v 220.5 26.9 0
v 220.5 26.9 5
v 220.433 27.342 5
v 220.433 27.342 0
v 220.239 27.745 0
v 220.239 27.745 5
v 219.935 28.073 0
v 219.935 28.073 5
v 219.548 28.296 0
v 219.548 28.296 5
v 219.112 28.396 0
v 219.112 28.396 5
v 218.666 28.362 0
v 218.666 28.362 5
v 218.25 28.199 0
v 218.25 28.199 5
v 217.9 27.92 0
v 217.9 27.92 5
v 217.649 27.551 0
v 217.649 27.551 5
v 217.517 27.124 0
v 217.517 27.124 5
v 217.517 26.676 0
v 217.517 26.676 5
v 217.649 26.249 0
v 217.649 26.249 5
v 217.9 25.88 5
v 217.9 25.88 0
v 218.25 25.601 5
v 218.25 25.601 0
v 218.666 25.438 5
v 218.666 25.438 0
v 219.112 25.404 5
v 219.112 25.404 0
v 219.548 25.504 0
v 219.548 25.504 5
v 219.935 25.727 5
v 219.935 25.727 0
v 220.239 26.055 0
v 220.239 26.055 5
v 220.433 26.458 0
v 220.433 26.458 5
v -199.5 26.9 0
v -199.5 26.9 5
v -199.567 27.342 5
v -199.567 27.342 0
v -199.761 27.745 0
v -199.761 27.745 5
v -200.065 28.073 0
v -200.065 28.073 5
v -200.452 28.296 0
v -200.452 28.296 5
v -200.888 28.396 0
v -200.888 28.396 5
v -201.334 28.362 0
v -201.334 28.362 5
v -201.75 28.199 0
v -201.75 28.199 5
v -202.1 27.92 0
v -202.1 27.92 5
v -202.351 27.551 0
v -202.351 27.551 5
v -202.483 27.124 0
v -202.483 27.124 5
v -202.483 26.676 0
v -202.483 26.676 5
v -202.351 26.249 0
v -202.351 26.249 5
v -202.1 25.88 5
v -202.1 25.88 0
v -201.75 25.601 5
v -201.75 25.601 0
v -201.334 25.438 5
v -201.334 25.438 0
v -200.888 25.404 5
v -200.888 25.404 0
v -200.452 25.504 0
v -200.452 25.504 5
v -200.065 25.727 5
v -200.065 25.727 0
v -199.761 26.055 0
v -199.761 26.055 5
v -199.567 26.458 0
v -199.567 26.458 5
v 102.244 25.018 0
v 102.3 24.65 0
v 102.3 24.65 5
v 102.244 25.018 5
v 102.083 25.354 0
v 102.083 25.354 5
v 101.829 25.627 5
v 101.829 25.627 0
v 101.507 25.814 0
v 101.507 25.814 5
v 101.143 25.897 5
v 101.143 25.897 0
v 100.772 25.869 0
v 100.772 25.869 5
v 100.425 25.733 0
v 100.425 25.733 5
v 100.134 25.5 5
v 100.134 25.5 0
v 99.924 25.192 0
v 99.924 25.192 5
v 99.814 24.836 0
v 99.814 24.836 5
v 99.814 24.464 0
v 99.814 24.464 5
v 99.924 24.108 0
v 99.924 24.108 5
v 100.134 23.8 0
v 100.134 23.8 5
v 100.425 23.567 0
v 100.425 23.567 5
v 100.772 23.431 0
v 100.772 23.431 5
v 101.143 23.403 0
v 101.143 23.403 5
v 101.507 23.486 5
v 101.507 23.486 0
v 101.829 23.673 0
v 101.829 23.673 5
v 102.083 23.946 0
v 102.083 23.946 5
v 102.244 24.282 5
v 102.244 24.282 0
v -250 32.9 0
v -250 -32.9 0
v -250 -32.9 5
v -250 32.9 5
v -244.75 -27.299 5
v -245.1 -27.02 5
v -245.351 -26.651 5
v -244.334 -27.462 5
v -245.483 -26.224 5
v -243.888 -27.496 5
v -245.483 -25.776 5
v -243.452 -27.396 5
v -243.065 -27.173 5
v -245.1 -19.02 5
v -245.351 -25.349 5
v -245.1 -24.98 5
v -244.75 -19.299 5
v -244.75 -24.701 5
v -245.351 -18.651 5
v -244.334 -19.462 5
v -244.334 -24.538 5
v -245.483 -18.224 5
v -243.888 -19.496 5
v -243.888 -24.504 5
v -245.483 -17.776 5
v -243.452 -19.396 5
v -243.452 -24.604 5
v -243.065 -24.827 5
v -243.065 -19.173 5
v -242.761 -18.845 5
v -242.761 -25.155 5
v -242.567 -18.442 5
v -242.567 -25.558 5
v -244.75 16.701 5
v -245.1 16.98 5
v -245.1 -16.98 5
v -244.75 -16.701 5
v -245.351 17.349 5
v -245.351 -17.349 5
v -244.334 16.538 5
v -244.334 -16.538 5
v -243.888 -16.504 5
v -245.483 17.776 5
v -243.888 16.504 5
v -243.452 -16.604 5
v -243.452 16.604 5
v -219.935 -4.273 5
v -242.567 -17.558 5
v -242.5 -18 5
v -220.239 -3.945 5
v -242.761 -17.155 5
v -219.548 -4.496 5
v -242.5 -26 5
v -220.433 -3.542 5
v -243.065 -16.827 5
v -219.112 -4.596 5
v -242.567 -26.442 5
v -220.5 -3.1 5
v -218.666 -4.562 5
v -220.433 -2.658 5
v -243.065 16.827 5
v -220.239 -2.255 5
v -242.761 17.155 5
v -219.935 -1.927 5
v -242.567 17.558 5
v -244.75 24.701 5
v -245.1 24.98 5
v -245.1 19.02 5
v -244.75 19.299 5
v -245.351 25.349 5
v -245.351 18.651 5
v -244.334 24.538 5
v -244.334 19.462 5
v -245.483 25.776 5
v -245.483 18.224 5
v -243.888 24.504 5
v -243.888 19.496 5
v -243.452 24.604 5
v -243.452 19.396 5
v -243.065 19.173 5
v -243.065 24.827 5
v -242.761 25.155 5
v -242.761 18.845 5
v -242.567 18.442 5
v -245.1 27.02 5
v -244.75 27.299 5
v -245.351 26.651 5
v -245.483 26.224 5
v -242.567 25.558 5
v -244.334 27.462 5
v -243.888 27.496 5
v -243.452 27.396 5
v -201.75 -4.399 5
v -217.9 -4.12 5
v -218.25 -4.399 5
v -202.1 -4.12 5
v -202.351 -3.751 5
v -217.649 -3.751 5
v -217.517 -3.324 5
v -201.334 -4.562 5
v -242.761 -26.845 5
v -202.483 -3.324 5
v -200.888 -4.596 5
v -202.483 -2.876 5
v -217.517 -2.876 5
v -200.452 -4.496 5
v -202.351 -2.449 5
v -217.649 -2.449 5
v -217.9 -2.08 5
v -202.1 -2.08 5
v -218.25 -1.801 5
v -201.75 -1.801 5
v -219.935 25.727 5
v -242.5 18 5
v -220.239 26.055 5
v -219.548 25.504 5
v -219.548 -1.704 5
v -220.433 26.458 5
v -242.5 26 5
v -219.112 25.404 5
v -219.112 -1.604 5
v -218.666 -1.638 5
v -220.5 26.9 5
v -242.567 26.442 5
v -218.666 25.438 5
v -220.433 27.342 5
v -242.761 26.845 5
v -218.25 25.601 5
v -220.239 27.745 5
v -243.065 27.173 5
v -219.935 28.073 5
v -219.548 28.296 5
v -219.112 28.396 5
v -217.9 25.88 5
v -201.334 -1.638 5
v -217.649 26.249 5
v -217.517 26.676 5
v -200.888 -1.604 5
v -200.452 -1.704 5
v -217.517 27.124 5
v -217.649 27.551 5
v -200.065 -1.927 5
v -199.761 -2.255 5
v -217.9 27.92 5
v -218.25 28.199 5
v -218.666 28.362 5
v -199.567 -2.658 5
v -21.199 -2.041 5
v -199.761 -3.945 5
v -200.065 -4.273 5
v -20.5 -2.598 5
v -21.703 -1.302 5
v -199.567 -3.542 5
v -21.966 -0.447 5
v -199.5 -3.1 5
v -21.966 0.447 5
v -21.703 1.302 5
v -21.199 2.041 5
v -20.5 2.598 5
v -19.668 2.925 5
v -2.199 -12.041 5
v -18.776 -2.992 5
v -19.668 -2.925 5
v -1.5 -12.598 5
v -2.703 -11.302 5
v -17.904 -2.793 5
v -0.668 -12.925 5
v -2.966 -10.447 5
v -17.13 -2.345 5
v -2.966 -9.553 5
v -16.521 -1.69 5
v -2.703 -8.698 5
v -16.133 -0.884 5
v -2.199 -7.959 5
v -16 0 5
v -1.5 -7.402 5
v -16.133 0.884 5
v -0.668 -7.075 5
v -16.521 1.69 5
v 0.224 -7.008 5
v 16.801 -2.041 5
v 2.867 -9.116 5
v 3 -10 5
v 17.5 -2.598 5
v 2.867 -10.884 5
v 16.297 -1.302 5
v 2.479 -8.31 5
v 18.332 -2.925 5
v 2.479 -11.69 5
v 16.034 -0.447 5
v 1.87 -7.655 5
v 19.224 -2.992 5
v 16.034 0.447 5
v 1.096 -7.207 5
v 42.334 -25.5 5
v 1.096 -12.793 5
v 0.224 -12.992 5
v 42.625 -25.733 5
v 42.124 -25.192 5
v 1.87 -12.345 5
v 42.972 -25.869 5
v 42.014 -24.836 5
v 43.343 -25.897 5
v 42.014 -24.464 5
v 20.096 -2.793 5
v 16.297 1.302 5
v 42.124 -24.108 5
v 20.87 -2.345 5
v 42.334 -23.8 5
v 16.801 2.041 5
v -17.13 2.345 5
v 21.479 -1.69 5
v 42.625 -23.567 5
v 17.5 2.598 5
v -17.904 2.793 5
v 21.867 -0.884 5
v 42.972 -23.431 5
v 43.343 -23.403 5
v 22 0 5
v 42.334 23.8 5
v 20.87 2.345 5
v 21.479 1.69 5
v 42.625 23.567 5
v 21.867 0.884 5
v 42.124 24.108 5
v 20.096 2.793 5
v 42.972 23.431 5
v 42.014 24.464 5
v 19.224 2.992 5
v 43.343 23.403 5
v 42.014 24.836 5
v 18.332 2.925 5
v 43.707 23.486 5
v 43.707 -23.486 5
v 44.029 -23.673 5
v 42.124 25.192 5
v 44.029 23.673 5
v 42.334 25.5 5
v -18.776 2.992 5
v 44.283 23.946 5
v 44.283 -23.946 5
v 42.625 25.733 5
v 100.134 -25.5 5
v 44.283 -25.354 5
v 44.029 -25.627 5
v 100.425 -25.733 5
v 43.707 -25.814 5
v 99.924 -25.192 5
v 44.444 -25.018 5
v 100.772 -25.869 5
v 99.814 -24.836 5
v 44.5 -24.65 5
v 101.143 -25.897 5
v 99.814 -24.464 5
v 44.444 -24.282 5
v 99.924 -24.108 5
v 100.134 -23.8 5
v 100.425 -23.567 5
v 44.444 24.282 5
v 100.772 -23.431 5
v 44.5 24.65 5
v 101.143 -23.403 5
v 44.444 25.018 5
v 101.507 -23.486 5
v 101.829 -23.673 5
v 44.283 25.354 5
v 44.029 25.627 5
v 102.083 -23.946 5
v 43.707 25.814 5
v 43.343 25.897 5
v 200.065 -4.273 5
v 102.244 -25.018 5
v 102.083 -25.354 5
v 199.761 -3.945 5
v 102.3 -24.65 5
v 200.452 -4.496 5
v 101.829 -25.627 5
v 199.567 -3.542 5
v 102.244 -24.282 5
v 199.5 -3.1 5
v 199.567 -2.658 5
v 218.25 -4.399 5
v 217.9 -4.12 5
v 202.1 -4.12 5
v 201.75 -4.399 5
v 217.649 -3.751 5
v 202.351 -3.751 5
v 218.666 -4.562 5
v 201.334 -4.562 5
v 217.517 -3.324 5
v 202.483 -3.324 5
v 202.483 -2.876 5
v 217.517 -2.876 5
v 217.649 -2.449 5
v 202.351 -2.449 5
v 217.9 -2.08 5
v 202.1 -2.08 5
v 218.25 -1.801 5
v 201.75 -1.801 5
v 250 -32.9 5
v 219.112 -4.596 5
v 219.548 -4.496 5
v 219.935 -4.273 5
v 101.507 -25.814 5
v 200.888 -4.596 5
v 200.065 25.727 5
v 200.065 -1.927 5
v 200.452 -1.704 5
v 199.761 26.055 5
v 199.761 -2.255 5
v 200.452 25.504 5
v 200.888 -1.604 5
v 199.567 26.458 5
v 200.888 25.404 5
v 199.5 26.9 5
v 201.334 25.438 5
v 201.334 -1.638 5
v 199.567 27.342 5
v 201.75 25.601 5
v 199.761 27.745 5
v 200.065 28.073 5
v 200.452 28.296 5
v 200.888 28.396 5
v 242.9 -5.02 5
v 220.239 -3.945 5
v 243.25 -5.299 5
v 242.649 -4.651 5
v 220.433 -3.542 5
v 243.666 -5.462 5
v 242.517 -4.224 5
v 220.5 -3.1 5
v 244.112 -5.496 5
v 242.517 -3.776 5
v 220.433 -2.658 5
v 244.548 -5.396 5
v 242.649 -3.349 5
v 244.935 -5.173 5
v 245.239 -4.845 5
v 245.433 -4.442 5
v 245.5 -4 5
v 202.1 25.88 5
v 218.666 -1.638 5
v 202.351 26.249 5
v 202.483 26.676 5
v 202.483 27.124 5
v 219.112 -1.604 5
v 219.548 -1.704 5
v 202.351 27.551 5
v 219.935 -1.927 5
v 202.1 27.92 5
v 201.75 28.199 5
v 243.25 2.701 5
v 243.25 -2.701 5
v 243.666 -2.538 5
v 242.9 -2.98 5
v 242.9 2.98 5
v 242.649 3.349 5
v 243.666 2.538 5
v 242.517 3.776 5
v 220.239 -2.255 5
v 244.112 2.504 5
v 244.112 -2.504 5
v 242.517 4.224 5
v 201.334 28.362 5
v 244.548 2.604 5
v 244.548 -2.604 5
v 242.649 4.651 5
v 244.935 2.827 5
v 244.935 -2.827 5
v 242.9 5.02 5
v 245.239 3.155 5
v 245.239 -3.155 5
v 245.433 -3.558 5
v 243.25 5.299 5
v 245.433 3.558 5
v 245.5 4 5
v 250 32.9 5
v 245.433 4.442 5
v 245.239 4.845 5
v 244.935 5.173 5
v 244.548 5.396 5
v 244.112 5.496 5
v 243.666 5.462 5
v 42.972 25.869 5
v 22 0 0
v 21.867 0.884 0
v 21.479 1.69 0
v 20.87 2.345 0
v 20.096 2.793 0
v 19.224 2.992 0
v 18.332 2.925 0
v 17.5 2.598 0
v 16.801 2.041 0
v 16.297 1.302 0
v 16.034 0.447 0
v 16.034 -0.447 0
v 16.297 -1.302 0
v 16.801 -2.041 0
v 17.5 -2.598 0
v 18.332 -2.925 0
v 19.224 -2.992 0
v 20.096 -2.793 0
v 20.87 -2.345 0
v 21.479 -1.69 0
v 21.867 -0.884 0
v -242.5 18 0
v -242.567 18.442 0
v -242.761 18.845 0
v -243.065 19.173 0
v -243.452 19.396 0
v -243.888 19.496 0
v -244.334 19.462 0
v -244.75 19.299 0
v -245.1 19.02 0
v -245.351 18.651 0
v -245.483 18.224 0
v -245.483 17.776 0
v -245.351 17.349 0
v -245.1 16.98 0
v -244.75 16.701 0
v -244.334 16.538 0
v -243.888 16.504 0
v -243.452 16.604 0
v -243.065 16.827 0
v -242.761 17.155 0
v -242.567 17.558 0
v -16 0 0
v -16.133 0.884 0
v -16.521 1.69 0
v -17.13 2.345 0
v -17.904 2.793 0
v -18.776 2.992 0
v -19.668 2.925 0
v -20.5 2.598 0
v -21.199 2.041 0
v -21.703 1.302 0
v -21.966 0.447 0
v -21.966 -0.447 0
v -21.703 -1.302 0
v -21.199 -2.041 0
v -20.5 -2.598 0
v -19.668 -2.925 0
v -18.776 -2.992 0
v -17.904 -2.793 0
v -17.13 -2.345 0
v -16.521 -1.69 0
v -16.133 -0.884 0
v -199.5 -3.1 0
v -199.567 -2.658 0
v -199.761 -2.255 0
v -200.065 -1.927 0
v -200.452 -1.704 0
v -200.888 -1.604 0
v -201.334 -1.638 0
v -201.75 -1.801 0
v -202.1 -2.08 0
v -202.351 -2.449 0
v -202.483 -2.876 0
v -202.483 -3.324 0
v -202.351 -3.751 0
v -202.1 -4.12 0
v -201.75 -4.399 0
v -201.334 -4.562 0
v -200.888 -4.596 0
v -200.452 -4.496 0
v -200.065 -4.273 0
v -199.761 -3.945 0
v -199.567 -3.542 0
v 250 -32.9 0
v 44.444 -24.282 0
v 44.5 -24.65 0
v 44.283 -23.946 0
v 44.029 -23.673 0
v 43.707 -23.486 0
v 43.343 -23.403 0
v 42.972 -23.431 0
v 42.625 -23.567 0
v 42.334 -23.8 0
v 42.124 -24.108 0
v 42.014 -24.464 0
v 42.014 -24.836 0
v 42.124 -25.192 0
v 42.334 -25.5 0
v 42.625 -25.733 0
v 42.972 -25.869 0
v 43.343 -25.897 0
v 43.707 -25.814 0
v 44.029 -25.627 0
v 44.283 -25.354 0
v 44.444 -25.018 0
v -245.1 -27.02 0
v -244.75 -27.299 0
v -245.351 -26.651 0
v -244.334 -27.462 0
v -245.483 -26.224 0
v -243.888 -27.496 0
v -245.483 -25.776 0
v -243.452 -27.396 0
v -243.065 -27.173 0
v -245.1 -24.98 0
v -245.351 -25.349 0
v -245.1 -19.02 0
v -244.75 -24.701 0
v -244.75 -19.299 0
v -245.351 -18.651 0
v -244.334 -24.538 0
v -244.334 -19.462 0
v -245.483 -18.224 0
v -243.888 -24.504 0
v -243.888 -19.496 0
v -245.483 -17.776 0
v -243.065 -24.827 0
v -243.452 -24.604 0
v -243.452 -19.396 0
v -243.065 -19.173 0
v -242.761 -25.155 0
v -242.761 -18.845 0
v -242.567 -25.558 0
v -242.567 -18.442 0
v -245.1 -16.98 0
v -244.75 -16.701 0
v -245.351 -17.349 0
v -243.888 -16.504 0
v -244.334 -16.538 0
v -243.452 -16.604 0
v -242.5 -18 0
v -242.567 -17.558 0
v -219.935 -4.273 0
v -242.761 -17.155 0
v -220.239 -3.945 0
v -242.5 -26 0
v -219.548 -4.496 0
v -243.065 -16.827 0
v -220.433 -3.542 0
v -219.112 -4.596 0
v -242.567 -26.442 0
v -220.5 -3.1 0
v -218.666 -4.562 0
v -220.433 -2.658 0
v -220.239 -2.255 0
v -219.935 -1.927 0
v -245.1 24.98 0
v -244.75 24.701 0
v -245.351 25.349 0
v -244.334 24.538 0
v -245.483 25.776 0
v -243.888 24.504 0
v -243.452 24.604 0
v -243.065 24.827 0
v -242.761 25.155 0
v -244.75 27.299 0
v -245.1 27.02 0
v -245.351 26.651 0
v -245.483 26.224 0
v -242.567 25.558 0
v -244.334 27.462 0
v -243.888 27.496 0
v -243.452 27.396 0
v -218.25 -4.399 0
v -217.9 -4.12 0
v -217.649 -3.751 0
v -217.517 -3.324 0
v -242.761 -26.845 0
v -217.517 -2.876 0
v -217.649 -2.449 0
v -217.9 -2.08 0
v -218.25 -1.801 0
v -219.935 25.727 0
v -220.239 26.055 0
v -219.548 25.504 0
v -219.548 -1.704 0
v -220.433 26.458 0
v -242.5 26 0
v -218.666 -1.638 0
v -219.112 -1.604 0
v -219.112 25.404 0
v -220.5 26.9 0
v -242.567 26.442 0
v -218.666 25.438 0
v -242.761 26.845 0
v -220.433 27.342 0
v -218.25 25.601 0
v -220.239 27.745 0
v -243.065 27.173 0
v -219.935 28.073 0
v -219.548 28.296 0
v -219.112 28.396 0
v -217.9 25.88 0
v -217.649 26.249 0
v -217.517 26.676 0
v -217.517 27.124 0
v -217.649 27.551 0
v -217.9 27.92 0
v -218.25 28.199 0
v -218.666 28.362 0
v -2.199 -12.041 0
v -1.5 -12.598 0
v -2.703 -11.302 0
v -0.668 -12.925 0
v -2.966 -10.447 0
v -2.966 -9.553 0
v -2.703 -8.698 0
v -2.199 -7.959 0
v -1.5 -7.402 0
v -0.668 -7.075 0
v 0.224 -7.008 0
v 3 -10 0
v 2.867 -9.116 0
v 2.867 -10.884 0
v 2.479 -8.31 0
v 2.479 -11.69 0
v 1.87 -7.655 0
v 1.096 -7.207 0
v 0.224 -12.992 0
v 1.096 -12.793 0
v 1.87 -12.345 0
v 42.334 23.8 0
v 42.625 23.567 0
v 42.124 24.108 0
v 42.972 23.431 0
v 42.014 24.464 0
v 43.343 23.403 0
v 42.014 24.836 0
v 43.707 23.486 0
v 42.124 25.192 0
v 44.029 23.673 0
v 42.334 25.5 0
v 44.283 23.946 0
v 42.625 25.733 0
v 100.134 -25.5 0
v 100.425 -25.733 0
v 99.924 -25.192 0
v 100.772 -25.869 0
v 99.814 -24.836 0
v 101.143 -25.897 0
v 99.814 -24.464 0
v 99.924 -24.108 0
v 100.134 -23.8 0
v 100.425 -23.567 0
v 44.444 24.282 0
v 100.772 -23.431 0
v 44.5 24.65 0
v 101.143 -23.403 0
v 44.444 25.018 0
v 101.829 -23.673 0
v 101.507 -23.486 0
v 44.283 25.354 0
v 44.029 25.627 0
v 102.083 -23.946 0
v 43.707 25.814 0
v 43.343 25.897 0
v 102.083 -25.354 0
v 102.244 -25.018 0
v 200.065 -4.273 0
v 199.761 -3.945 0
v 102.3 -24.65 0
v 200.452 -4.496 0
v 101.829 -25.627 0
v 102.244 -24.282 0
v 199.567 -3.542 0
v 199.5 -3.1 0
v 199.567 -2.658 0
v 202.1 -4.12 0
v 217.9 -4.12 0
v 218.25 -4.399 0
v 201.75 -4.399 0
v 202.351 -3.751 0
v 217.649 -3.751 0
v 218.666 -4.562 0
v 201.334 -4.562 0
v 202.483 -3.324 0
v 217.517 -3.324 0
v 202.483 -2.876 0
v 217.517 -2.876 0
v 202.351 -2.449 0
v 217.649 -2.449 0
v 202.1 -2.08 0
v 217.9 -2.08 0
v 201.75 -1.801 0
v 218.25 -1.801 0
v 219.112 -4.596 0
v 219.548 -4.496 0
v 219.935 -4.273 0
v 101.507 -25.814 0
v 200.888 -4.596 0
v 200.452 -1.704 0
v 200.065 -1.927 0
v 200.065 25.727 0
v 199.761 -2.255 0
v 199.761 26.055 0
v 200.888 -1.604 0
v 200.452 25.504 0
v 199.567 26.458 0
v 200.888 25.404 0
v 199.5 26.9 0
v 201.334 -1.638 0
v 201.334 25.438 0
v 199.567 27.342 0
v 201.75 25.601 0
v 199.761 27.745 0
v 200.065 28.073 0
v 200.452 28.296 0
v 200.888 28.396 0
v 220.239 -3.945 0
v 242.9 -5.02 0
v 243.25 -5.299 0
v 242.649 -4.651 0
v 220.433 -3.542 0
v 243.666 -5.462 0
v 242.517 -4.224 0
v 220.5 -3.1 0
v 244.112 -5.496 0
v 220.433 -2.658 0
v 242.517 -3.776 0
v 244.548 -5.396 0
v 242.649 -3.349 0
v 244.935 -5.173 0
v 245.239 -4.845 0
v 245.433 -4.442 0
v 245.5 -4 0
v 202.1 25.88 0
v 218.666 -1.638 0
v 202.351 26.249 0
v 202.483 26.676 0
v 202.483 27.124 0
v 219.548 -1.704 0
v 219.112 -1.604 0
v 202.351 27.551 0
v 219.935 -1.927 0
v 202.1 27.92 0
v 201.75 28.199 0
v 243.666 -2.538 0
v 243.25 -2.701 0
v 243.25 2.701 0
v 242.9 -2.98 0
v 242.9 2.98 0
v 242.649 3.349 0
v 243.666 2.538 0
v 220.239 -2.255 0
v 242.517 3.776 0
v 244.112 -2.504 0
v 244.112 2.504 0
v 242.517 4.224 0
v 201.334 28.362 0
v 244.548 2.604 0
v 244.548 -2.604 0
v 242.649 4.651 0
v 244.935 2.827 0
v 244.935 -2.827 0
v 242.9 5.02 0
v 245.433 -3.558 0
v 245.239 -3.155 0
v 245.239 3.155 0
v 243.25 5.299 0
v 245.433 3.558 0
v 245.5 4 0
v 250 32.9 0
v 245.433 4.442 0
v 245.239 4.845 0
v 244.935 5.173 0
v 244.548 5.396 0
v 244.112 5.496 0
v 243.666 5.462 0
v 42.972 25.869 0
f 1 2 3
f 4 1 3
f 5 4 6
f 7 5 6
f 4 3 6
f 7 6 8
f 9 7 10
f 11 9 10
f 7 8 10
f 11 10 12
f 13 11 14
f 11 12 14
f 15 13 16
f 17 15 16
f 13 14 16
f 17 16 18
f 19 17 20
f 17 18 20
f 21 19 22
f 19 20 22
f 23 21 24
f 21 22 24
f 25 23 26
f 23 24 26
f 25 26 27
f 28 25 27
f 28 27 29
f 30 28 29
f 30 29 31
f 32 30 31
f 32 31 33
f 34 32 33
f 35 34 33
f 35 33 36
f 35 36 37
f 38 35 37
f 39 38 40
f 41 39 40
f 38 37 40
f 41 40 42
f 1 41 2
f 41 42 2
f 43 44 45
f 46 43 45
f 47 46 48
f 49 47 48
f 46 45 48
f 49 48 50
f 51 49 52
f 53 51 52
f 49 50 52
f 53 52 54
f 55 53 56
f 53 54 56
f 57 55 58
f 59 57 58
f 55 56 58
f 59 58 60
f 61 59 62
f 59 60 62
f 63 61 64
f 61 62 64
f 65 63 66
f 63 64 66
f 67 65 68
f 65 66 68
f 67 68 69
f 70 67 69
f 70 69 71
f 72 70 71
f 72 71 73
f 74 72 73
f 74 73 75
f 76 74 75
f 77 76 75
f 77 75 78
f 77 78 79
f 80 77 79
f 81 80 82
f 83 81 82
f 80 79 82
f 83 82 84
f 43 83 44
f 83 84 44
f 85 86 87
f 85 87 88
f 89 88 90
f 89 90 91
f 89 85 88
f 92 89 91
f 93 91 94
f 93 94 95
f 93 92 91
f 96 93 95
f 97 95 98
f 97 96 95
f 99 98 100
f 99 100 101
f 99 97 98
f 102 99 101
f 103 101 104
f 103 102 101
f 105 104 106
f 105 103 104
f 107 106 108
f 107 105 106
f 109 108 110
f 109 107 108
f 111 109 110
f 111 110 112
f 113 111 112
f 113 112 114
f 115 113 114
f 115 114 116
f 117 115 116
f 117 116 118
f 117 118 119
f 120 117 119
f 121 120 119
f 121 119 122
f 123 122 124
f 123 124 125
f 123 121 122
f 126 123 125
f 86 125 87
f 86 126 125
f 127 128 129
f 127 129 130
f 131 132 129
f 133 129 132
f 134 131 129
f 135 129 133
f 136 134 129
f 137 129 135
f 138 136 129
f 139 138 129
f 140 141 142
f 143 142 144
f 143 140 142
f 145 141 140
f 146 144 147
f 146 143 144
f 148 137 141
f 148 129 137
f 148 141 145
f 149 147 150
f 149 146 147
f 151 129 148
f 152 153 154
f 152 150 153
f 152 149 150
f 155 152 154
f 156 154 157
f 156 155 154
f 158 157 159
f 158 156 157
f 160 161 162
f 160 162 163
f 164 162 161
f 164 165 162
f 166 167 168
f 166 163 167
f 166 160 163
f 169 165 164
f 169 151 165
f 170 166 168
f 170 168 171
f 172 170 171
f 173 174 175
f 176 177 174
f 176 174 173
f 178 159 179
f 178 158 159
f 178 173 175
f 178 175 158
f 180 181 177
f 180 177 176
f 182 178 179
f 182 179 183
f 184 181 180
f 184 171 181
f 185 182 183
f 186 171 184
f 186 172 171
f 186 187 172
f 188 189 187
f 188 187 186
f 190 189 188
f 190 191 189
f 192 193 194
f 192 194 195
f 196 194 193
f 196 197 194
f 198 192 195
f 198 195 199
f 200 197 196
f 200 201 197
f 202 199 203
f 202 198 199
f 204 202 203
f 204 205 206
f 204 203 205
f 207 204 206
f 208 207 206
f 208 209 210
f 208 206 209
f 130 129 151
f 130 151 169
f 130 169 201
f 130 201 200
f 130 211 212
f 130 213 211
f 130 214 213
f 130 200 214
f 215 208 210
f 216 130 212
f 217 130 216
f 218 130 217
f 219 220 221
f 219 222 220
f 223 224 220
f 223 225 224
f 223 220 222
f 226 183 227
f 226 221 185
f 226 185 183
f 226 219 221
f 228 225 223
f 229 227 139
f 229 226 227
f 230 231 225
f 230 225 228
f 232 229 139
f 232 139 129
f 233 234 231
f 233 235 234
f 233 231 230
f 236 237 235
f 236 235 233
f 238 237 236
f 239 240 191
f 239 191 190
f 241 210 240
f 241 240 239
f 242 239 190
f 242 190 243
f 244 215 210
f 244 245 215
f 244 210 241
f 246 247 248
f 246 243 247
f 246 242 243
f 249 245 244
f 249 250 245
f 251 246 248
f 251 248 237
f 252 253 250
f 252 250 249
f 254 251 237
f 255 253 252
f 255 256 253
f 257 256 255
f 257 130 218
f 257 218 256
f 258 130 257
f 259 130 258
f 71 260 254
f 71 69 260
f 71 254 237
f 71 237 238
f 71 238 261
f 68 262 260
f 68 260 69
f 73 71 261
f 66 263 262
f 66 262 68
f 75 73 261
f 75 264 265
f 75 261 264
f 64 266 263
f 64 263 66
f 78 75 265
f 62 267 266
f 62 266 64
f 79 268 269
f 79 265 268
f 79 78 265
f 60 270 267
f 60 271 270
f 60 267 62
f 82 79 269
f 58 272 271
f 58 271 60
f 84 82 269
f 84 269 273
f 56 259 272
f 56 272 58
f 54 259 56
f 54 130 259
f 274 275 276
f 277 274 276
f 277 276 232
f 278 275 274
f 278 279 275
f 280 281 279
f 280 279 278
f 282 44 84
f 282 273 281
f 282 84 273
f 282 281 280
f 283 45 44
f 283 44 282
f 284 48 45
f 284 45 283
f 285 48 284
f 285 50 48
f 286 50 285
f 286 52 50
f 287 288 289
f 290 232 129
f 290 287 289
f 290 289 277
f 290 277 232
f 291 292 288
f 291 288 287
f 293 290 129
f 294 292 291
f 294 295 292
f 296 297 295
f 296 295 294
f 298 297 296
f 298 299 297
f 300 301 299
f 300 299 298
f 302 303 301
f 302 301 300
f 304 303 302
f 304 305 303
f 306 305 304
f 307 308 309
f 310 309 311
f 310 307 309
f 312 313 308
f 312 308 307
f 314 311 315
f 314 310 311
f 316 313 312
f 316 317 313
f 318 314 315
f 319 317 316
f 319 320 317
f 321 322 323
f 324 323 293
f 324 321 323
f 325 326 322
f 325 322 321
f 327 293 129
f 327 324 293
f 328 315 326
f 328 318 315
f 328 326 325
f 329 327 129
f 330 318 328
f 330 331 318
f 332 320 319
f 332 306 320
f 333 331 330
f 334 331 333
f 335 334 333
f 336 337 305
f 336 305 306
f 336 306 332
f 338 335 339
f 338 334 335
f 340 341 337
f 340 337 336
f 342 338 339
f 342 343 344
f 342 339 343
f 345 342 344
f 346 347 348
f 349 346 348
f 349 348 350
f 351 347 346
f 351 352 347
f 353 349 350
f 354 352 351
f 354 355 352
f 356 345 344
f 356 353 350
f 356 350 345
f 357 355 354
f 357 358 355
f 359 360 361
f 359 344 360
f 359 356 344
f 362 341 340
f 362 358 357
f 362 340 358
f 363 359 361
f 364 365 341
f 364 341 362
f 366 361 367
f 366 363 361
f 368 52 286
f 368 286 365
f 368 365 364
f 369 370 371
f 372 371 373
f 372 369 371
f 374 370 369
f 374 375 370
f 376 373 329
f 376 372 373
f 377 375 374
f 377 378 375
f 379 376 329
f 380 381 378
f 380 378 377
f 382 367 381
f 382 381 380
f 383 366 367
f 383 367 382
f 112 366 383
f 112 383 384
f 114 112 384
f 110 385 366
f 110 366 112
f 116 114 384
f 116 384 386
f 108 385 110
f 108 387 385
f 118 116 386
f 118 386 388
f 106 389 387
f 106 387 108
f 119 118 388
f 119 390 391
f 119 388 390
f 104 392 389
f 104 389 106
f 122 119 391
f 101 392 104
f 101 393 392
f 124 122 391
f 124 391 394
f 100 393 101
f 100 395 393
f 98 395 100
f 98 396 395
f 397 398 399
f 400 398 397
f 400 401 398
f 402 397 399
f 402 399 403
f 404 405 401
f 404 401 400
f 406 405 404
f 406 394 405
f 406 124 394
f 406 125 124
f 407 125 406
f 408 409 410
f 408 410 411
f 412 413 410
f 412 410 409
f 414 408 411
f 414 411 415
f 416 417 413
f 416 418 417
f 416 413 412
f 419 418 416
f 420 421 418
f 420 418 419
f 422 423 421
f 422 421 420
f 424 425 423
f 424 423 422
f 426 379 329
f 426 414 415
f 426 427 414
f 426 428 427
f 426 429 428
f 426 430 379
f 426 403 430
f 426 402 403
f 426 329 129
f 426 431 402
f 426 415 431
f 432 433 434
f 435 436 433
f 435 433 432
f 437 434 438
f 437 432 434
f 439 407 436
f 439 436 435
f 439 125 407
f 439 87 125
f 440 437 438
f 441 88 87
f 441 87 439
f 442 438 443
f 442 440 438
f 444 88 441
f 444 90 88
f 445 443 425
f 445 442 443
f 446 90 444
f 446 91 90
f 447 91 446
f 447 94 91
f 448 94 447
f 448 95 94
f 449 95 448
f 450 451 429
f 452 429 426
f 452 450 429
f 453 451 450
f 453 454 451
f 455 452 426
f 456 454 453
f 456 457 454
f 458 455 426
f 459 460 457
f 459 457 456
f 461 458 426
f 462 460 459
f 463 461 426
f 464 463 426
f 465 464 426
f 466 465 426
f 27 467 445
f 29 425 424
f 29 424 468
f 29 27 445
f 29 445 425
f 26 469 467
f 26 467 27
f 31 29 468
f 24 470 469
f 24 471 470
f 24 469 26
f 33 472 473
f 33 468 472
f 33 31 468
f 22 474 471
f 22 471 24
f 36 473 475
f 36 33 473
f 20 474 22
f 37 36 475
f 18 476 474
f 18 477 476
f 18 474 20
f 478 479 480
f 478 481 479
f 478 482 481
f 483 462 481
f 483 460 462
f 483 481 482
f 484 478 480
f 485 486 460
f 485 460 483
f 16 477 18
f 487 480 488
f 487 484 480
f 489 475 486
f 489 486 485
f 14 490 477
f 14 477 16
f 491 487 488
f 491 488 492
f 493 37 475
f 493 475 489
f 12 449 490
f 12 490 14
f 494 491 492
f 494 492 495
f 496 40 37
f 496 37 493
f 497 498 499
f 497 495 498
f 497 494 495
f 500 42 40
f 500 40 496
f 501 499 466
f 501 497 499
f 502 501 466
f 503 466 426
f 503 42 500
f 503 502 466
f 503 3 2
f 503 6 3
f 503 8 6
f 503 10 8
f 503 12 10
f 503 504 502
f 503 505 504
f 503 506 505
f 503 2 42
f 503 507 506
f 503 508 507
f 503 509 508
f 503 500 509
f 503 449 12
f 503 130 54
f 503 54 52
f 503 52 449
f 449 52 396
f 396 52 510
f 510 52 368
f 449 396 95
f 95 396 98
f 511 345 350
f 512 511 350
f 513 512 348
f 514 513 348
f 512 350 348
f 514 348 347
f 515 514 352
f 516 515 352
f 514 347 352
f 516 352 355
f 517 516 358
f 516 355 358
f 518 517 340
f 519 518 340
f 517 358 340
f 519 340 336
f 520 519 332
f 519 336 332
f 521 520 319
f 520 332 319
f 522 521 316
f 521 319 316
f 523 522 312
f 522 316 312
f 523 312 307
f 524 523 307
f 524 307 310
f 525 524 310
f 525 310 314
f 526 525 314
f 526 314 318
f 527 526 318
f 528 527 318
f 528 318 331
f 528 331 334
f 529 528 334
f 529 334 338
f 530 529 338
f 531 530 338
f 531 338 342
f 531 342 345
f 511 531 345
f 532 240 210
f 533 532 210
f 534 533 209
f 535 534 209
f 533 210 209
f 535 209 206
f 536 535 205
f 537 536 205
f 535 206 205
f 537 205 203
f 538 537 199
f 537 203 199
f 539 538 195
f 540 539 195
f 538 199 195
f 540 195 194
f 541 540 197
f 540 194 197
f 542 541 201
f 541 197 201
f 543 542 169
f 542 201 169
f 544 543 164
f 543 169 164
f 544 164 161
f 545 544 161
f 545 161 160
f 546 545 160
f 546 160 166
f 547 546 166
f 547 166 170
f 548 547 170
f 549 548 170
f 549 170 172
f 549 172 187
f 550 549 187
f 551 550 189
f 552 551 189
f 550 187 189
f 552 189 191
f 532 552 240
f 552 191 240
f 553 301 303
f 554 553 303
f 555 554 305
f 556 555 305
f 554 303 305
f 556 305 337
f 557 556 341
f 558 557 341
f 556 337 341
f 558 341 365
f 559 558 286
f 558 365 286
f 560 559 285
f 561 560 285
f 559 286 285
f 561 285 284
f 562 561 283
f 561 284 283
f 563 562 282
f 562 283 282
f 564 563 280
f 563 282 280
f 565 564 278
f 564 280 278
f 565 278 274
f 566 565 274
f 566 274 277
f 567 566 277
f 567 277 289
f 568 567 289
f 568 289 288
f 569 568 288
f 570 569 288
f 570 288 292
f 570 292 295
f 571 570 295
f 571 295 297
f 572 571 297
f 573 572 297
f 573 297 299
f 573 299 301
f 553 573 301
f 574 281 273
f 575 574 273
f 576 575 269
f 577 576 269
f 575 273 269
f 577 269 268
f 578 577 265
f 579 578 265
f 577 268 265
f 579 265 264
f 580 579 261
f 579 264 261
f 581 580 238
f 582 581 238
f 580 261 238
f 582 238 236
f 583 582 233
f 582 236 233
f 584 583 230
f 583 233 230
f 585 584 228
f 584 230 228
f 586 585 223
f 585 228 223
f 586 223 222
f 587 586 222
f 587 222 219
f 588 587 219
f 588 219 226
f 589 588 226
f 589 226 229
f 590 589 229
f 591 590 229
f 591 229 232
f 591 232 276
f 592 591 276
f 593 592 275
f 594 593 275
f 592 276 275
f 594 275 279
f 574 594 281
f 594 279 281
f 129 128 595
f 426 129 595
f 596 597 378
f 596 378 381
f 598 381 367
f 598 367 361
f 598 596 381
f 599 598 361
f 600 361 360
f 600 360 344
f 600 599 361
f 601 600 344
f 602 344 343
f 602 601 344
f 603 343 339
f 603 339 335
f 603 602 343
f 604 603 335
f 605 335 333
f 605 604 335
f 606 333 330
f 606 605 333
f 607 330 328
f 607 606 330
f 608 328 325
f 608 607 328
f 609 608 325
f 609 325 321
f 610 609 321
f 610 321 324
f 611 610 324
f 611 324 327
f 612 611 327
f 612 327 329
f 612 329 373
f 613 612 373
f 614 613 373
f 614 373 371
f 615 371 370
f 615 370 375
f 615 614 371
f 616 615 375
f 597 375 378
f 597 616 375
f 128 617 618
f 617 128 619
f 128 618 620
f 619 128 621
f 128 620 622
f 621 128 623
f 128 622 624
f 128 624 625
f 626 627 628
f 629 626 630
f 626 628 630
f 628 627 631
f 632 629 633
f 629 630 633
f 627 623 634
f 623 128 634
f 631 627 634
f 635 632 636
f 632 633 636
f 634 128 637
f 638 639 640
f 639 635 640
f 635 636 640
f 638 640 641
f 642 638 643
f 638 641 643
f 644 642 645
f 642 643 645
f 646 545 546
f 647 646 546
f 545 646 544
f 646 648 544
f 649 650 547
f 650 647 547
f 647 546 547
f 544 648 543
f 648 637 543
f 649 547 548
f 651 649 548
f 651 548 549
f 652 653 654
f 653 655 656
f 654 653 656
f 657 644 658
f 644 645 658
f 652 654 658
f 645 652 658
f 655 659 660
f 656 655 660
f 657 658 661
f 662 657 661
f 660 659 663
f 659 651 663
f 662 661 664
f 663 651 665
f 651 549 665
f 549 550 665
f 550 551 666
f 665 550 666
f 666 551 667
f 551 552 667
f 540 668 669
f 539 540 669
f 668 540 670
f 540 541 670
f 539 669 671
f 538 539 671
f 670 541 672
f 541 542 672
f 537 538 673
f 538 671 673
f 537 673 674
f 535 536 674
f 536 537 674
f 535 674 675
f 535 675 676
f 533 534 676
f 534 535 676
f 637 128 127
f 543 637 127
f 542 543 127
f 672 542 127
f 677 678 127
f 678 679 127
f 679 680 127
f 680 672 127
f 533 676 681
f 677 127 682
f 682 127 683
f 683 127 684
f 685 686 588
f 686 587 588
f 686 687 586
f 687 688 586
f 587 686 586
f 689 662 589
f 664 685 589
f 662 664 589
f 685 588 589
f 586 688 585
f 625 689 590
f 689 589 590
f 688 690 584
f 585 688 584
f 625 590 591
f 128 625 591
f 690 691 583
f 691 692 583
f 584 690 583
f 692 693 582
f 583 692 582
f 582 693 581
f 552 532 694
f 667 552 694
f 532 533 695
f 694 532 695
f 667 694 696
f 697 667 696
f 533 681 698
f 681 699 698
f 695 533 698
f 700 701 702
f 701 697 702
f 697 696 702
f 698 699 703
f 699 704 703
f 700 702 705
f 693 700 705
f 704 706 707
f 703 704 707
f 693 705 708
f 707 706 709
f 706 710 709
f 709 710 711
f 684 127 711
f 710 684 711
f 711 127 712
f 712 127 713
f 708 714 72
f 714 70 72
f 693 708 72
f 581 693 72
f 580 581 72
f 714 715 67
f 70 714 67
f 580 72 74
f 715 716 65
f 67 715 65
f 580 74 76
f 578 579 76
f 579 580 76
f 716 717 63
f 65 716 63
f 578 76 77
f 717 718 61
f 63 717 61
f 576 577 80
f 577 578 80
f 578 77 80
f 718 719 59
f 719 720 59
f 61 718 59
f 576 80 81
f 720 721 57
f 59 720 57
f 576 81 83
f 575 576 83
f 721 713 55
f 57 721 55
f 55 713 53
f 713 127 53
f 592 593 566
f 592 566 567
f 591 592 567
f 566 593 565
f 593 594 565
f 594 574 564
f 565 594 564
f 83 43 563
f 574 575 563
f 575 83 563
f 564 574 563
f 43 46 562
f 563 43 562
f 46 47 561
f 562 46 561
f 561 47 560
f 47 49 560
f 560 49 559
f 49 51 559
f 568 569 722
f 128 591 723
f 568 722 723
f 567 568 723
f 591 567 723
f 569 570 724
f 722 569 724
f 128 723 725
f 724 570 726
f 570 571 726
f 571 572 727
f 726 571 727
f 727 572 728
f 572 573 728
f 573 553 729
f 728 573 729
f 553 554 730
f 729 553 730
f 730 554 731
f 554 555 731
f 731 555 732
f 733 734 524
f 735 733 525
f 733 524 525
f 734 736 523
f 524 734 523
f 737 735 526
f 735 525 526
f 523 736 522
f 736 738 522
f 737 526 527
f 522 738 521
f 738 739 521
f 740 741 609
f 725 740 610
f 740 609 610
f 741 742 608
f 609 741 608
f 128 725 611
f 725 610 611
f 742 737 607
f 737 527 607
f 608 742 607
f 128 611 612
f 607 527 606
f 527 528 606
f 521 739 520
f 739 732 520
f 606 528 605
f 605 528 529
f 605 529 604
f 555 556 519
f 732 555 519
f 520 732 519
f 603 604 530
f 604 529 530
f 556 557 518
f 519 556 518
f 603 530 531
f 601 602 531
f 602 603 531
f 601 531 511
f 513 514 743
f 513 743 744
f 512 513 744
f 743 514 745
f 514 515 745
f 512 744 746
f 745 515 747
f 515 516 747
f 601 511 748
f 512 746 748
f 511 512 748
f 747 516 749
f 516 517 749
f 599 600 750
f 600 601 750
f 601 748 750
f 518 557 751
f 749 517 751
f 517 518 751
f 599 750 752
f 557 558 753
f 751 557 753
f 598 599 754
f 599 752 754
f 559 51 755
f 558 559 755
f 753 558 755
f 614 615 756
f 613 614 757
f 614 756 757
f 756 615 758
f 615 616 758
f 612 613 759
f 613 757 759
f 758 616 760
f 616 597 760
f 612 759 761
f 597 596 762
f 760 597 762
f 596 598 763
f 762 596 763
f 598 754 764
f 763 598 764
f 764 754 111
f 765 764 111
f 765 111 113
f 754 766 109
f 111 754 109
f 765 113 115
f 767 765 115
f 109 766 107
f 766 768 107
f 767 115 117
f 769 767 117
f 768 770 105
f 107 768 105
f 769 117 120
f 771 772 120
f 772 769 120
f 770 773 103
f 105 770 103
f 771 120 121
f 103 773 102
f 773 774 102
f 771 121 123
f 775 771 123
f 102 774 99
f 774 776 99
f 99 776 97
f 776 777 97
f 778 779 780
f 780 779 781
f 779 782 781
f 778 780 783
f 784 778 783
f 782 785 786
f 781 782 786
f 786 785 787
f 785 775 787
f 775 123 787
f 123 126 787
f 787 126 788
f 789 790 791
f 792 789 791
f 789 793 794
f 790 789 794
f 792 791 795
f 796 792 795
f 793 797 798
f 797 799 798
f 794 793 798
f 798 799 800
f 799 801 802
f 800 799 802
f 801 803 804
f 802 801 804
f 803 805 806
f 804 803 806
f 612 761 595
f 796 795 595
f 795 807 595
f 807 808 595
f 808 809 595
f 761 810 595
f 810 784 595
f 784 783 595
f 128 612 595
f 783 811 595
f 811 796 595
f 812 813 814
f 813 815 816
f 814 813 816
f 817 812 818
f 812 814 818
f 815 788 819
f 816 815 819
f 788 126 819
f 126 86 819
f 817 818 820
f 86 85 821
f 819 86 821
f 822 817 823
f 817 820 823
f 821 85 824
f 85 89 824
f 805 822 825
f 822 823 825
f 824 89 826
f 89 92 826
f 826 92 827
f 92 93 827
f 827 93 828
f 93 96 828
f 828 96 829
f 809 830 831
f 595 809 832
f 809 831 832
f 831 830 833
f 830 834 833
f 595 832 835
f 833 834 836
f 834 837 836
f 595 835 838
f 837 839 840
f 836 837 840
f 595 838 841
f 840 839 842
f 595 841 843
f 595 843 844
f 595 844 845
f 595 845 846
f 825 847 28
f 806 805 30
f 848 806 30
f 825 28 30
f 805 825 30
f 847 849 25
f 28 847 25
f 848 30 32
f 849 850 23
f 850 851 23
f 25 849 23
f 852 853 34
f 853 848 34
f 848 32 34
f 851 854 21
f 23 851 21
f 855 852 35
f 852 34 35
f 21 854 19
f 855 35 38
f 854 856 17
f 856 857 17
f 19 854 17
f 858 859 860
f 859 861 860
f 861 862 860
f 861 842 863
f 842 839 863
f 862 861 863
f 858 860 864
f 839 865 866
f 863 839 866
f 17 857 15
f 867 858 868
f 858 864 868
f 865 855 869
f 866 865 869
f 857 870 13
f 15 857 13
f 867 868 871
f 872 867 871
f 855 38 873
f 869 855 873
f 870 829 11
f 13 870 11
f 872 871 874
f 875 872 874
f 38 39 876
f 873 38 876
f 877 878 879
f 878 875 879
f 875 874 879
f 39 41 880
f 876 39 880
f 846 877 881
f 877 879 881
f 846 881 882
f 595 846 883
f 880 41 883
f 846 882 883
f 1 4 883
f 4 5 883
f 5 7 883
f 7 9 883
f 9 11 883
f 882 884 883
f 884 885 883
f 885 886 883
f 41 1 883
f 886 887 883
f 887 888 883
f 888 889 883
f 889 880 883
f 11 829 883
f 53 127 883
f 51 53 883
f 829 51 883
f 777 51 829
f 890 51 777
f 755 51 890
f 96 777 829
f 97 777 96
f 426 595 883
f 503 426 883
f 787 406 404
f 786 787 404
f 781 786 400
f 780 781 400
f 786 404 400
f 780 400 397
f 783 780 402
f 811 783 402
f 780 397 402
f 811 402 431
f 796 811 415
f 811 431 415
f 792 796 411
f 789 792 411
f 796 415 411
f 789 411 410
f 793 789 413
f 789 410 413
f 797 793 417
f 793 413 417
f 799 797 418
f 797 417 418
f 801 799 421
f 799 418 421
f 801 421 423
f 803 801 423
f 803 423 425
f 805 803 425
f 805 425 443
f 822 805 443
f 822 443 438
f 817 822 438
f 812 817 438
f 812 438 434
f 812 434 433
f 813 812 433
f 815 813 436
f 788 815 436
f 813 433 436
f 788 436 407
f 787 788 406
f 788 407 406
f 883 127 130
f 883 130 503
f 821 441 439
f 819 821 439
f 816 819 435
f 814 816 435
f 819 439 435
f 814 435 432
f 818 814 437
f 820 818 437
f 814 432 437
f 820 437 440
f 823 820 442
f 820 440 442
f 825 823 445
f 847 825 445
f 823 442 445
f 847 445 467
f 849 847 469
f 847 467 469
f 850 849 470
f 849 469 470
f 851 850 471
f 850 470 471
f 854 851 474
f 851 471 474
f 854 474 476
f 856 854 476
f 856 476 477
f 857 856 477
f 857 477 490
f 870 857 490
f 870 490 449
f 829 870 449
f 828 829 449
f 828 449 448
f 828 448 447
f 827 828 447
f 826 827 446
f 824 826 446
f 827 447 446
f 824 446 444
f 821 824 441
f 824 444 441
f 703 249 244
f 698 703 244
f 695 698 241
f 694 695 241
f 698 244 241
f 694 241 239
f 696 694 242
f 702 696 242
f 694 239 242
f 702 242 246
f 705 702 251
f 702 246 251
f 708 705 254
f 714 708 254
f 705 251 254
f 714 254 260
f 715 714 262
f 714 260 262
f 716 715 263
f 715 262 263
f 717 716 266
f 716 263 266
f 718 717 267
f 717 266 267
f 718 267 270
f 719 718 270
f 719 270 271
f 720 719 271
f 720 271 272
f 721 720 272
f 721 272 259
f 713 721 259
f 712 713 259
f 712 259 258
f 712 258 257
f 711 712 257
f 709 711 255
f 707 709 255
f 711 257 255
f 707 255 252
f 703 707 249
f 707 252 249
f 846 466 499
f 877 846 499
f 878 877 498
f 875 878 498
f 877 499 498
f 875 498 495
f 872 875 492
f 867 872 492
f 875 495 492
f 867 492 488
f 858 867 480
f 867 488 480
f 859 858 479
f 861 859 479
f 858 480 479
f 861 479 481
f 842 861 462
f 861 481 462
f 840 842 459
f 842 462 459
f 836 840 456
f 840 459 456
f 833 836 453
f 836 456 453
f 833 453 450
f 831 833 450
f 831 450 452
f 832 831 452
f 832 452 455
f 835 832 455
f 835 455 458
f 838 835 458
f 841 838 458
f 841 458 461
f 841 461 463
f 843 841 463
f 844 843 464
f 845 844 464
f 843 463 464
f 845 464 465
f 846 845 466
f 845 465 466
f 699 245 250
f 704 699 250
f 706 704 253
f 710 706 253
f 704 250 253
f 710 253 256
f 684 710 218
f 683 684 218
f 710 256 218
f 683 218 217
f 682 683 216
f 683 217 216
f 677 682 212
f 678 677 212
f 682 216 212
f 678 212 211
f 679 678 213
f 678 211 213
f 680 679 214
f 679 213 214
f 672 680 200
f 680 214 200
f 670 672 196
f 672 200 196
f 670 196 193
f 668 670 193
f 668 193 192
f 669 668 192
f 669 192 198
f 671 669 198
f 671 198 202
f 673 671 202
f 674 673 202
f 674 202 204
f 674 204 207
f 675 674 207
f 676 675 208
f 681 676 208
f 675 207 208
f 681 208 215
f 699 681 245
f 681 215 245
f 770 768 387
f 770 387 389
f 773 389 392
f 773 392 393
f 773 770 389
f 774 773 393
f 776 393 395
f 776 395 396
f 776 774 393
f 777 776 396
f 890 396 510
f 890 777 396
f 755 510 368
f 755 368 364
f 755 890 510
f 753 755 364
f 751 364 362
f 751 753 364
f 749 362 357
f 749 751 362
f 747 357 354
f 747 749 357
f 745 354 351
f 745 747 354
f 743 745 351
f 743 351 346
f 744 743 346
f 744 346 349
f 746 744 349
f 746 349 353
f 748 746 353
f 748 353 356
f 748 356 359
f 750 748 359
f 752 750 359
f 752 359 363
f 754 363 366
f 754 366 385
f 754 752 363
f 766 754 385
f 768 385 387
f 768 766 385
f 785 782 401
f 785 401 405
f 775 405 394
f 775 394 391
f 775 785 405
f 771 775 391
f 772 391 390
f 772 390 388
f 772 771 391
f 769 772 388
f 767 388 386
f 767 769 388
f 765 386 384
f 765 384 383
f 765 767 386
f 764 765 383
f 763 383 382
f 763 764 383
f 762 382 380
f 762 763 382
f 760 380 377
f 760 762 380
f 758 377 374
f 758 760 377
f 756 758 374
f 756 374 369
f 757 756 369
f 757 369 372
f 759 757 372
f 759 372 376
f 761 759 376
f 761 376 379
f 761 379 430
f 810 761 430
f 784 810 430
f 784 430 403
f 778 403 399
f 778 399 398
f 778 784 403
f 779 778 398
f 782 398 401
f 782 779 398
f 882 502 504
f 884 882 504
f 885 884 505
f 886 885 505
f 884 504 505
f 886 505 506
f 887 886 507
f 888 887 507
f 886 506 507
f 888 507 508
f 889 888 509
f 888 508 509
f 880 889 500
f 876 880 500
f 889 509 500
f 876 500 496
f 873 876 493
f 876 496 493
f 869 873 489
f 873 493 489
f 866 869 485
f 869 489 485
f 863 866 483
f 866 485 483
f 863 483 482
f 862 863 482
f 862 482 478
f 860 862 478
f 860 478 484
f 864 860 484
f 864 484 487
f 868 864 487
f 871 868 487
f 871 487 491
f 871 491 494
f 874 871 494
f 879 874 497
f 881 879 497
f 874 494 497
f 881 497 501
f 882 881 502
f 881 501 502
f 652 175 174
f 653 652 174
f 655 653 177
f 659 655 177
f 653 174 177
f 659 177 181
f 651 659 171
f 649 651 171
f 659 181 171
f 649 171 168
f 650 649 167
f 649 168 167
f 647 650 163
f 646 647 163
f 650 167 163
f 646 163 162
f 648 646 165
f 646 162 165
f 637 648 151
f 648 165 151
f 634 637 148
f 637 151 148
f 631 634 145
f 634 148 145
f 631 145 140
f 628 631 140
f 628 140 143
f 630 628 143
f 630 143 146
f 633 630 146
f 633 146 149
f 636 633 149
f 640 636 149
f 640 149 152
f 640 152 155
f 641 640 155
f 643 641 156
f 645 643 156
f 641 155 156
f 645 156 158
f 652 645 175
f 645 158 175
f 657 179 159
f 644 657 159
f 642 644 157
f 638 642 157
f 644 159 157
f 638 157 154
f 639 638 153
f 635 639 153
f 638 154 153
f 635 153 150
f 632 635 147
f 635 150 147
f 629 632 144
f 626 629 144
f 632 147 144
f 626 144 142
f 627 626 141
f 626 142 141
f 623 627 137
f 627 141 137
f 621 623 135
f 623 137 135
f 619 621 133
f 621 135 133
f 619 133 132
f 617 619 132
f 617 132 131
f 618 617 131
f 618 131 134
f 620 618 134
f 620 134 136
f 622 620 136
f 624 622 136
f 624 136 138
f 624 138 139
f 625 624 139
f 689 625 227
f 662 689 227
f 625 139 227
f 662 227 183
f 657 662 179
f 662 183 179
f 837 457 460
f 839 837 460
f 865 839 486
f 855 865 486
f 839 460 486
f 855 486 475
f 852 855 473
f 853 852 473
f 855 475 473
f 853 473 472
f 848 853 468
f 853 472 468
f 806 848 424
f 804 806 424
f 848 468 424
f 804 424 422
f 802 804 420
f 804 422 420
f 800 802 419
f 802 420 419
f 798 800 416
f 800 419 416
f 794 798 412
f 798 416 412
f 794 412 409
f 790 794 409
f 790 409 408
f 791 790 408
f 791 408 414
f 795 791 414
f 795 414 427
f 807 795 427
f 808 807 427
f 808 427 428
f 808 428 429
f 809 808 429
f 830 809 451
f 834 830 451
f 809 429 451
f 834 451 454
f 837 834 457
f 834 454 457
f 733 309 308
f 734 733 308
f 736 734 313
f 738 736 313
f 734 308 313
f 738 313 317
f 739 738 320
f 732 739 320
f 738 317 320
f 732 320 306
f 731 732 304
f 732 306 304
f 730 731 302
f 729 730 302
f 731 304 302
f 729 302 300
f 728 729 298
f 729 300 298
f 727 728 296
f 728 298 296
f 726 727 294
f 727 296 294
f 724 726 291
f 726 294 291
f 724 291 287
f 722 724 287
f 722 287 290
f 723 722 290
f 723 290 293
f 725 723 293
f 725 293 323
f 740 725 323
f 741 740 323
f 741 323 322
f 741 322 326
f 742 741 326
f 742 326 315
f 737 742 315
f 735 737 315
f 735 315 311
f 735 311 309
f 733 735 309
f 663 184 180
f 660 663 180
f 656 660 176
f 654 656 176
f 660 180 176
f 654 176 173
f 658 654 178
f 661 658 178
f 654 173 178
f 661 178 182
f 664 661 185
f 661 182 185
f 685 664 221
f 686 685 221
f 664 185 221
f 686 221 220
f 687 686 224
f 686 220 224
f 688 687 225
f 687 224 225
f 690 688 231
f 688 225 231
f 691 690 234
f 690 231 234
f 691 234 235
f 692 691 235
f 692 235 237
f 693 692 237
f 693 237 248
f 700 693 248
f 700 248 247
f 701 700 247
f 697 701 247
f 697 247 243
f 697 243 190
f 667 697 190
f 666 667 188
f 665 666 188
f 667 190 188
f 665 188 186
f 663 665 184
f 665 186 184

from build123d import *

# Parameters (mm, degrees)
SKETCH_3_W          = 500
SKETCH_3_H          = 65.8
SKETCH_3_R          = 1.25
EXTRUDE_2_DEPTH     = 5
SKETCH_4_R          = 1.5
CUT_EXTRUDE_1_DEPTH = 5
SKETCH_5_R          = 1.5
CUT_EXTRUDE_2_DEPTH = 5
SKETCH_6_R          = 3
CUT_EXTRUDE_3_DEPTH = 10


with BuildPart() as part:
    # 草图3 → 凸台-拉伸2 (new body)
    with BuildSketch(Plane.XY):
        Rectangle(SKETCH_3_W, SKETCH_3_H)
        with Locations((43.25, 24.65)):
            Circle(SKETCH_3_R, mode=Mode.SUBTRACT)
        with Locations((43.25, -24.65)):
            Circle(SKETCH_3_R, mode=Mode.SUBTRACT)
        with Locations((101.05, -24.65)):
            Circle(SKETCH_3_R, mode=Mode.SUBTRACT)
        with Locations((101.05, 24.65)):
            Circle(SKETCH_3_R, mode=Mode.SUBTRACT)
    extrude(amount=EXTRUDE_2_DEPTH)

    # 草图4 → 切除-拉伸1 (cut)
    with BuildSketch(Plane.XY.offset(5)):
        with Locations((219, 26.9)):
            Circle(SKETCH_4_R)
        with Locations((219, -3.1)):
            Circle(SKETCH_4_R)
        with Locations((-219, -3.1)):
            Circle(SKETCH_4_R)
        with Locations((-219, 26.9)):
            Circle(SKETCH_4_R)
        with Locations((201, -3.1)):
            Circle(SKETCH_4_R)
        with Locations((201, 26.9)):
            Circle(SKETCH_4_R)
        with Locations((-201, -3.1)):
            Circle(SKETCH_4_R)
        with Locations((-201, 26.9)):
            Circle(SKETCH_4_R)
    extrude(amount=-CUT_EXTRUDE_1_DEPTH, mode=Mode.SUBTRACT)

    # 草图5 → 切除-拉伸2 (cut)
    with BuildSketch(Plane.XY.offset(5)):
        with Locations((-244, 26)):
            Circle(SKETCH_5_R)
        with Locations((-244, 18)):
            Circle(SKETCH_5_R)
        with Locations((-244, -18)):
            Circle(SKETCH_5_R)
        with Locations((-244, -26)):
            Circle(SKETCH_5_R)
        with Locations((244, -4)):
            Circle(SKETCH_5_R)
        with Locations((244, 4)):
            Circle(SKETCH_5_R)
    extrude(amount=-CUT_EXTRUDE_2_DEPTH, mode=Mode.SUBTRACT)

    # 草图6 → 切除-拉伸3 (cut)
    with BuildSketch(Plane.XY.offset(5)):
        with Locations((19, 0)):
            Circle(SKETCH_6_R)
        with Locations((-19, 0)):
            Circle(SKETCH_6_R)
        with Locations((0, -10)):
            Circle(SKETCH_6_R)
    extrude(amount=-CUT_EXTRUDE_3_DEPTH, mode=Mode.SUBTRACT)


solid = part.part
